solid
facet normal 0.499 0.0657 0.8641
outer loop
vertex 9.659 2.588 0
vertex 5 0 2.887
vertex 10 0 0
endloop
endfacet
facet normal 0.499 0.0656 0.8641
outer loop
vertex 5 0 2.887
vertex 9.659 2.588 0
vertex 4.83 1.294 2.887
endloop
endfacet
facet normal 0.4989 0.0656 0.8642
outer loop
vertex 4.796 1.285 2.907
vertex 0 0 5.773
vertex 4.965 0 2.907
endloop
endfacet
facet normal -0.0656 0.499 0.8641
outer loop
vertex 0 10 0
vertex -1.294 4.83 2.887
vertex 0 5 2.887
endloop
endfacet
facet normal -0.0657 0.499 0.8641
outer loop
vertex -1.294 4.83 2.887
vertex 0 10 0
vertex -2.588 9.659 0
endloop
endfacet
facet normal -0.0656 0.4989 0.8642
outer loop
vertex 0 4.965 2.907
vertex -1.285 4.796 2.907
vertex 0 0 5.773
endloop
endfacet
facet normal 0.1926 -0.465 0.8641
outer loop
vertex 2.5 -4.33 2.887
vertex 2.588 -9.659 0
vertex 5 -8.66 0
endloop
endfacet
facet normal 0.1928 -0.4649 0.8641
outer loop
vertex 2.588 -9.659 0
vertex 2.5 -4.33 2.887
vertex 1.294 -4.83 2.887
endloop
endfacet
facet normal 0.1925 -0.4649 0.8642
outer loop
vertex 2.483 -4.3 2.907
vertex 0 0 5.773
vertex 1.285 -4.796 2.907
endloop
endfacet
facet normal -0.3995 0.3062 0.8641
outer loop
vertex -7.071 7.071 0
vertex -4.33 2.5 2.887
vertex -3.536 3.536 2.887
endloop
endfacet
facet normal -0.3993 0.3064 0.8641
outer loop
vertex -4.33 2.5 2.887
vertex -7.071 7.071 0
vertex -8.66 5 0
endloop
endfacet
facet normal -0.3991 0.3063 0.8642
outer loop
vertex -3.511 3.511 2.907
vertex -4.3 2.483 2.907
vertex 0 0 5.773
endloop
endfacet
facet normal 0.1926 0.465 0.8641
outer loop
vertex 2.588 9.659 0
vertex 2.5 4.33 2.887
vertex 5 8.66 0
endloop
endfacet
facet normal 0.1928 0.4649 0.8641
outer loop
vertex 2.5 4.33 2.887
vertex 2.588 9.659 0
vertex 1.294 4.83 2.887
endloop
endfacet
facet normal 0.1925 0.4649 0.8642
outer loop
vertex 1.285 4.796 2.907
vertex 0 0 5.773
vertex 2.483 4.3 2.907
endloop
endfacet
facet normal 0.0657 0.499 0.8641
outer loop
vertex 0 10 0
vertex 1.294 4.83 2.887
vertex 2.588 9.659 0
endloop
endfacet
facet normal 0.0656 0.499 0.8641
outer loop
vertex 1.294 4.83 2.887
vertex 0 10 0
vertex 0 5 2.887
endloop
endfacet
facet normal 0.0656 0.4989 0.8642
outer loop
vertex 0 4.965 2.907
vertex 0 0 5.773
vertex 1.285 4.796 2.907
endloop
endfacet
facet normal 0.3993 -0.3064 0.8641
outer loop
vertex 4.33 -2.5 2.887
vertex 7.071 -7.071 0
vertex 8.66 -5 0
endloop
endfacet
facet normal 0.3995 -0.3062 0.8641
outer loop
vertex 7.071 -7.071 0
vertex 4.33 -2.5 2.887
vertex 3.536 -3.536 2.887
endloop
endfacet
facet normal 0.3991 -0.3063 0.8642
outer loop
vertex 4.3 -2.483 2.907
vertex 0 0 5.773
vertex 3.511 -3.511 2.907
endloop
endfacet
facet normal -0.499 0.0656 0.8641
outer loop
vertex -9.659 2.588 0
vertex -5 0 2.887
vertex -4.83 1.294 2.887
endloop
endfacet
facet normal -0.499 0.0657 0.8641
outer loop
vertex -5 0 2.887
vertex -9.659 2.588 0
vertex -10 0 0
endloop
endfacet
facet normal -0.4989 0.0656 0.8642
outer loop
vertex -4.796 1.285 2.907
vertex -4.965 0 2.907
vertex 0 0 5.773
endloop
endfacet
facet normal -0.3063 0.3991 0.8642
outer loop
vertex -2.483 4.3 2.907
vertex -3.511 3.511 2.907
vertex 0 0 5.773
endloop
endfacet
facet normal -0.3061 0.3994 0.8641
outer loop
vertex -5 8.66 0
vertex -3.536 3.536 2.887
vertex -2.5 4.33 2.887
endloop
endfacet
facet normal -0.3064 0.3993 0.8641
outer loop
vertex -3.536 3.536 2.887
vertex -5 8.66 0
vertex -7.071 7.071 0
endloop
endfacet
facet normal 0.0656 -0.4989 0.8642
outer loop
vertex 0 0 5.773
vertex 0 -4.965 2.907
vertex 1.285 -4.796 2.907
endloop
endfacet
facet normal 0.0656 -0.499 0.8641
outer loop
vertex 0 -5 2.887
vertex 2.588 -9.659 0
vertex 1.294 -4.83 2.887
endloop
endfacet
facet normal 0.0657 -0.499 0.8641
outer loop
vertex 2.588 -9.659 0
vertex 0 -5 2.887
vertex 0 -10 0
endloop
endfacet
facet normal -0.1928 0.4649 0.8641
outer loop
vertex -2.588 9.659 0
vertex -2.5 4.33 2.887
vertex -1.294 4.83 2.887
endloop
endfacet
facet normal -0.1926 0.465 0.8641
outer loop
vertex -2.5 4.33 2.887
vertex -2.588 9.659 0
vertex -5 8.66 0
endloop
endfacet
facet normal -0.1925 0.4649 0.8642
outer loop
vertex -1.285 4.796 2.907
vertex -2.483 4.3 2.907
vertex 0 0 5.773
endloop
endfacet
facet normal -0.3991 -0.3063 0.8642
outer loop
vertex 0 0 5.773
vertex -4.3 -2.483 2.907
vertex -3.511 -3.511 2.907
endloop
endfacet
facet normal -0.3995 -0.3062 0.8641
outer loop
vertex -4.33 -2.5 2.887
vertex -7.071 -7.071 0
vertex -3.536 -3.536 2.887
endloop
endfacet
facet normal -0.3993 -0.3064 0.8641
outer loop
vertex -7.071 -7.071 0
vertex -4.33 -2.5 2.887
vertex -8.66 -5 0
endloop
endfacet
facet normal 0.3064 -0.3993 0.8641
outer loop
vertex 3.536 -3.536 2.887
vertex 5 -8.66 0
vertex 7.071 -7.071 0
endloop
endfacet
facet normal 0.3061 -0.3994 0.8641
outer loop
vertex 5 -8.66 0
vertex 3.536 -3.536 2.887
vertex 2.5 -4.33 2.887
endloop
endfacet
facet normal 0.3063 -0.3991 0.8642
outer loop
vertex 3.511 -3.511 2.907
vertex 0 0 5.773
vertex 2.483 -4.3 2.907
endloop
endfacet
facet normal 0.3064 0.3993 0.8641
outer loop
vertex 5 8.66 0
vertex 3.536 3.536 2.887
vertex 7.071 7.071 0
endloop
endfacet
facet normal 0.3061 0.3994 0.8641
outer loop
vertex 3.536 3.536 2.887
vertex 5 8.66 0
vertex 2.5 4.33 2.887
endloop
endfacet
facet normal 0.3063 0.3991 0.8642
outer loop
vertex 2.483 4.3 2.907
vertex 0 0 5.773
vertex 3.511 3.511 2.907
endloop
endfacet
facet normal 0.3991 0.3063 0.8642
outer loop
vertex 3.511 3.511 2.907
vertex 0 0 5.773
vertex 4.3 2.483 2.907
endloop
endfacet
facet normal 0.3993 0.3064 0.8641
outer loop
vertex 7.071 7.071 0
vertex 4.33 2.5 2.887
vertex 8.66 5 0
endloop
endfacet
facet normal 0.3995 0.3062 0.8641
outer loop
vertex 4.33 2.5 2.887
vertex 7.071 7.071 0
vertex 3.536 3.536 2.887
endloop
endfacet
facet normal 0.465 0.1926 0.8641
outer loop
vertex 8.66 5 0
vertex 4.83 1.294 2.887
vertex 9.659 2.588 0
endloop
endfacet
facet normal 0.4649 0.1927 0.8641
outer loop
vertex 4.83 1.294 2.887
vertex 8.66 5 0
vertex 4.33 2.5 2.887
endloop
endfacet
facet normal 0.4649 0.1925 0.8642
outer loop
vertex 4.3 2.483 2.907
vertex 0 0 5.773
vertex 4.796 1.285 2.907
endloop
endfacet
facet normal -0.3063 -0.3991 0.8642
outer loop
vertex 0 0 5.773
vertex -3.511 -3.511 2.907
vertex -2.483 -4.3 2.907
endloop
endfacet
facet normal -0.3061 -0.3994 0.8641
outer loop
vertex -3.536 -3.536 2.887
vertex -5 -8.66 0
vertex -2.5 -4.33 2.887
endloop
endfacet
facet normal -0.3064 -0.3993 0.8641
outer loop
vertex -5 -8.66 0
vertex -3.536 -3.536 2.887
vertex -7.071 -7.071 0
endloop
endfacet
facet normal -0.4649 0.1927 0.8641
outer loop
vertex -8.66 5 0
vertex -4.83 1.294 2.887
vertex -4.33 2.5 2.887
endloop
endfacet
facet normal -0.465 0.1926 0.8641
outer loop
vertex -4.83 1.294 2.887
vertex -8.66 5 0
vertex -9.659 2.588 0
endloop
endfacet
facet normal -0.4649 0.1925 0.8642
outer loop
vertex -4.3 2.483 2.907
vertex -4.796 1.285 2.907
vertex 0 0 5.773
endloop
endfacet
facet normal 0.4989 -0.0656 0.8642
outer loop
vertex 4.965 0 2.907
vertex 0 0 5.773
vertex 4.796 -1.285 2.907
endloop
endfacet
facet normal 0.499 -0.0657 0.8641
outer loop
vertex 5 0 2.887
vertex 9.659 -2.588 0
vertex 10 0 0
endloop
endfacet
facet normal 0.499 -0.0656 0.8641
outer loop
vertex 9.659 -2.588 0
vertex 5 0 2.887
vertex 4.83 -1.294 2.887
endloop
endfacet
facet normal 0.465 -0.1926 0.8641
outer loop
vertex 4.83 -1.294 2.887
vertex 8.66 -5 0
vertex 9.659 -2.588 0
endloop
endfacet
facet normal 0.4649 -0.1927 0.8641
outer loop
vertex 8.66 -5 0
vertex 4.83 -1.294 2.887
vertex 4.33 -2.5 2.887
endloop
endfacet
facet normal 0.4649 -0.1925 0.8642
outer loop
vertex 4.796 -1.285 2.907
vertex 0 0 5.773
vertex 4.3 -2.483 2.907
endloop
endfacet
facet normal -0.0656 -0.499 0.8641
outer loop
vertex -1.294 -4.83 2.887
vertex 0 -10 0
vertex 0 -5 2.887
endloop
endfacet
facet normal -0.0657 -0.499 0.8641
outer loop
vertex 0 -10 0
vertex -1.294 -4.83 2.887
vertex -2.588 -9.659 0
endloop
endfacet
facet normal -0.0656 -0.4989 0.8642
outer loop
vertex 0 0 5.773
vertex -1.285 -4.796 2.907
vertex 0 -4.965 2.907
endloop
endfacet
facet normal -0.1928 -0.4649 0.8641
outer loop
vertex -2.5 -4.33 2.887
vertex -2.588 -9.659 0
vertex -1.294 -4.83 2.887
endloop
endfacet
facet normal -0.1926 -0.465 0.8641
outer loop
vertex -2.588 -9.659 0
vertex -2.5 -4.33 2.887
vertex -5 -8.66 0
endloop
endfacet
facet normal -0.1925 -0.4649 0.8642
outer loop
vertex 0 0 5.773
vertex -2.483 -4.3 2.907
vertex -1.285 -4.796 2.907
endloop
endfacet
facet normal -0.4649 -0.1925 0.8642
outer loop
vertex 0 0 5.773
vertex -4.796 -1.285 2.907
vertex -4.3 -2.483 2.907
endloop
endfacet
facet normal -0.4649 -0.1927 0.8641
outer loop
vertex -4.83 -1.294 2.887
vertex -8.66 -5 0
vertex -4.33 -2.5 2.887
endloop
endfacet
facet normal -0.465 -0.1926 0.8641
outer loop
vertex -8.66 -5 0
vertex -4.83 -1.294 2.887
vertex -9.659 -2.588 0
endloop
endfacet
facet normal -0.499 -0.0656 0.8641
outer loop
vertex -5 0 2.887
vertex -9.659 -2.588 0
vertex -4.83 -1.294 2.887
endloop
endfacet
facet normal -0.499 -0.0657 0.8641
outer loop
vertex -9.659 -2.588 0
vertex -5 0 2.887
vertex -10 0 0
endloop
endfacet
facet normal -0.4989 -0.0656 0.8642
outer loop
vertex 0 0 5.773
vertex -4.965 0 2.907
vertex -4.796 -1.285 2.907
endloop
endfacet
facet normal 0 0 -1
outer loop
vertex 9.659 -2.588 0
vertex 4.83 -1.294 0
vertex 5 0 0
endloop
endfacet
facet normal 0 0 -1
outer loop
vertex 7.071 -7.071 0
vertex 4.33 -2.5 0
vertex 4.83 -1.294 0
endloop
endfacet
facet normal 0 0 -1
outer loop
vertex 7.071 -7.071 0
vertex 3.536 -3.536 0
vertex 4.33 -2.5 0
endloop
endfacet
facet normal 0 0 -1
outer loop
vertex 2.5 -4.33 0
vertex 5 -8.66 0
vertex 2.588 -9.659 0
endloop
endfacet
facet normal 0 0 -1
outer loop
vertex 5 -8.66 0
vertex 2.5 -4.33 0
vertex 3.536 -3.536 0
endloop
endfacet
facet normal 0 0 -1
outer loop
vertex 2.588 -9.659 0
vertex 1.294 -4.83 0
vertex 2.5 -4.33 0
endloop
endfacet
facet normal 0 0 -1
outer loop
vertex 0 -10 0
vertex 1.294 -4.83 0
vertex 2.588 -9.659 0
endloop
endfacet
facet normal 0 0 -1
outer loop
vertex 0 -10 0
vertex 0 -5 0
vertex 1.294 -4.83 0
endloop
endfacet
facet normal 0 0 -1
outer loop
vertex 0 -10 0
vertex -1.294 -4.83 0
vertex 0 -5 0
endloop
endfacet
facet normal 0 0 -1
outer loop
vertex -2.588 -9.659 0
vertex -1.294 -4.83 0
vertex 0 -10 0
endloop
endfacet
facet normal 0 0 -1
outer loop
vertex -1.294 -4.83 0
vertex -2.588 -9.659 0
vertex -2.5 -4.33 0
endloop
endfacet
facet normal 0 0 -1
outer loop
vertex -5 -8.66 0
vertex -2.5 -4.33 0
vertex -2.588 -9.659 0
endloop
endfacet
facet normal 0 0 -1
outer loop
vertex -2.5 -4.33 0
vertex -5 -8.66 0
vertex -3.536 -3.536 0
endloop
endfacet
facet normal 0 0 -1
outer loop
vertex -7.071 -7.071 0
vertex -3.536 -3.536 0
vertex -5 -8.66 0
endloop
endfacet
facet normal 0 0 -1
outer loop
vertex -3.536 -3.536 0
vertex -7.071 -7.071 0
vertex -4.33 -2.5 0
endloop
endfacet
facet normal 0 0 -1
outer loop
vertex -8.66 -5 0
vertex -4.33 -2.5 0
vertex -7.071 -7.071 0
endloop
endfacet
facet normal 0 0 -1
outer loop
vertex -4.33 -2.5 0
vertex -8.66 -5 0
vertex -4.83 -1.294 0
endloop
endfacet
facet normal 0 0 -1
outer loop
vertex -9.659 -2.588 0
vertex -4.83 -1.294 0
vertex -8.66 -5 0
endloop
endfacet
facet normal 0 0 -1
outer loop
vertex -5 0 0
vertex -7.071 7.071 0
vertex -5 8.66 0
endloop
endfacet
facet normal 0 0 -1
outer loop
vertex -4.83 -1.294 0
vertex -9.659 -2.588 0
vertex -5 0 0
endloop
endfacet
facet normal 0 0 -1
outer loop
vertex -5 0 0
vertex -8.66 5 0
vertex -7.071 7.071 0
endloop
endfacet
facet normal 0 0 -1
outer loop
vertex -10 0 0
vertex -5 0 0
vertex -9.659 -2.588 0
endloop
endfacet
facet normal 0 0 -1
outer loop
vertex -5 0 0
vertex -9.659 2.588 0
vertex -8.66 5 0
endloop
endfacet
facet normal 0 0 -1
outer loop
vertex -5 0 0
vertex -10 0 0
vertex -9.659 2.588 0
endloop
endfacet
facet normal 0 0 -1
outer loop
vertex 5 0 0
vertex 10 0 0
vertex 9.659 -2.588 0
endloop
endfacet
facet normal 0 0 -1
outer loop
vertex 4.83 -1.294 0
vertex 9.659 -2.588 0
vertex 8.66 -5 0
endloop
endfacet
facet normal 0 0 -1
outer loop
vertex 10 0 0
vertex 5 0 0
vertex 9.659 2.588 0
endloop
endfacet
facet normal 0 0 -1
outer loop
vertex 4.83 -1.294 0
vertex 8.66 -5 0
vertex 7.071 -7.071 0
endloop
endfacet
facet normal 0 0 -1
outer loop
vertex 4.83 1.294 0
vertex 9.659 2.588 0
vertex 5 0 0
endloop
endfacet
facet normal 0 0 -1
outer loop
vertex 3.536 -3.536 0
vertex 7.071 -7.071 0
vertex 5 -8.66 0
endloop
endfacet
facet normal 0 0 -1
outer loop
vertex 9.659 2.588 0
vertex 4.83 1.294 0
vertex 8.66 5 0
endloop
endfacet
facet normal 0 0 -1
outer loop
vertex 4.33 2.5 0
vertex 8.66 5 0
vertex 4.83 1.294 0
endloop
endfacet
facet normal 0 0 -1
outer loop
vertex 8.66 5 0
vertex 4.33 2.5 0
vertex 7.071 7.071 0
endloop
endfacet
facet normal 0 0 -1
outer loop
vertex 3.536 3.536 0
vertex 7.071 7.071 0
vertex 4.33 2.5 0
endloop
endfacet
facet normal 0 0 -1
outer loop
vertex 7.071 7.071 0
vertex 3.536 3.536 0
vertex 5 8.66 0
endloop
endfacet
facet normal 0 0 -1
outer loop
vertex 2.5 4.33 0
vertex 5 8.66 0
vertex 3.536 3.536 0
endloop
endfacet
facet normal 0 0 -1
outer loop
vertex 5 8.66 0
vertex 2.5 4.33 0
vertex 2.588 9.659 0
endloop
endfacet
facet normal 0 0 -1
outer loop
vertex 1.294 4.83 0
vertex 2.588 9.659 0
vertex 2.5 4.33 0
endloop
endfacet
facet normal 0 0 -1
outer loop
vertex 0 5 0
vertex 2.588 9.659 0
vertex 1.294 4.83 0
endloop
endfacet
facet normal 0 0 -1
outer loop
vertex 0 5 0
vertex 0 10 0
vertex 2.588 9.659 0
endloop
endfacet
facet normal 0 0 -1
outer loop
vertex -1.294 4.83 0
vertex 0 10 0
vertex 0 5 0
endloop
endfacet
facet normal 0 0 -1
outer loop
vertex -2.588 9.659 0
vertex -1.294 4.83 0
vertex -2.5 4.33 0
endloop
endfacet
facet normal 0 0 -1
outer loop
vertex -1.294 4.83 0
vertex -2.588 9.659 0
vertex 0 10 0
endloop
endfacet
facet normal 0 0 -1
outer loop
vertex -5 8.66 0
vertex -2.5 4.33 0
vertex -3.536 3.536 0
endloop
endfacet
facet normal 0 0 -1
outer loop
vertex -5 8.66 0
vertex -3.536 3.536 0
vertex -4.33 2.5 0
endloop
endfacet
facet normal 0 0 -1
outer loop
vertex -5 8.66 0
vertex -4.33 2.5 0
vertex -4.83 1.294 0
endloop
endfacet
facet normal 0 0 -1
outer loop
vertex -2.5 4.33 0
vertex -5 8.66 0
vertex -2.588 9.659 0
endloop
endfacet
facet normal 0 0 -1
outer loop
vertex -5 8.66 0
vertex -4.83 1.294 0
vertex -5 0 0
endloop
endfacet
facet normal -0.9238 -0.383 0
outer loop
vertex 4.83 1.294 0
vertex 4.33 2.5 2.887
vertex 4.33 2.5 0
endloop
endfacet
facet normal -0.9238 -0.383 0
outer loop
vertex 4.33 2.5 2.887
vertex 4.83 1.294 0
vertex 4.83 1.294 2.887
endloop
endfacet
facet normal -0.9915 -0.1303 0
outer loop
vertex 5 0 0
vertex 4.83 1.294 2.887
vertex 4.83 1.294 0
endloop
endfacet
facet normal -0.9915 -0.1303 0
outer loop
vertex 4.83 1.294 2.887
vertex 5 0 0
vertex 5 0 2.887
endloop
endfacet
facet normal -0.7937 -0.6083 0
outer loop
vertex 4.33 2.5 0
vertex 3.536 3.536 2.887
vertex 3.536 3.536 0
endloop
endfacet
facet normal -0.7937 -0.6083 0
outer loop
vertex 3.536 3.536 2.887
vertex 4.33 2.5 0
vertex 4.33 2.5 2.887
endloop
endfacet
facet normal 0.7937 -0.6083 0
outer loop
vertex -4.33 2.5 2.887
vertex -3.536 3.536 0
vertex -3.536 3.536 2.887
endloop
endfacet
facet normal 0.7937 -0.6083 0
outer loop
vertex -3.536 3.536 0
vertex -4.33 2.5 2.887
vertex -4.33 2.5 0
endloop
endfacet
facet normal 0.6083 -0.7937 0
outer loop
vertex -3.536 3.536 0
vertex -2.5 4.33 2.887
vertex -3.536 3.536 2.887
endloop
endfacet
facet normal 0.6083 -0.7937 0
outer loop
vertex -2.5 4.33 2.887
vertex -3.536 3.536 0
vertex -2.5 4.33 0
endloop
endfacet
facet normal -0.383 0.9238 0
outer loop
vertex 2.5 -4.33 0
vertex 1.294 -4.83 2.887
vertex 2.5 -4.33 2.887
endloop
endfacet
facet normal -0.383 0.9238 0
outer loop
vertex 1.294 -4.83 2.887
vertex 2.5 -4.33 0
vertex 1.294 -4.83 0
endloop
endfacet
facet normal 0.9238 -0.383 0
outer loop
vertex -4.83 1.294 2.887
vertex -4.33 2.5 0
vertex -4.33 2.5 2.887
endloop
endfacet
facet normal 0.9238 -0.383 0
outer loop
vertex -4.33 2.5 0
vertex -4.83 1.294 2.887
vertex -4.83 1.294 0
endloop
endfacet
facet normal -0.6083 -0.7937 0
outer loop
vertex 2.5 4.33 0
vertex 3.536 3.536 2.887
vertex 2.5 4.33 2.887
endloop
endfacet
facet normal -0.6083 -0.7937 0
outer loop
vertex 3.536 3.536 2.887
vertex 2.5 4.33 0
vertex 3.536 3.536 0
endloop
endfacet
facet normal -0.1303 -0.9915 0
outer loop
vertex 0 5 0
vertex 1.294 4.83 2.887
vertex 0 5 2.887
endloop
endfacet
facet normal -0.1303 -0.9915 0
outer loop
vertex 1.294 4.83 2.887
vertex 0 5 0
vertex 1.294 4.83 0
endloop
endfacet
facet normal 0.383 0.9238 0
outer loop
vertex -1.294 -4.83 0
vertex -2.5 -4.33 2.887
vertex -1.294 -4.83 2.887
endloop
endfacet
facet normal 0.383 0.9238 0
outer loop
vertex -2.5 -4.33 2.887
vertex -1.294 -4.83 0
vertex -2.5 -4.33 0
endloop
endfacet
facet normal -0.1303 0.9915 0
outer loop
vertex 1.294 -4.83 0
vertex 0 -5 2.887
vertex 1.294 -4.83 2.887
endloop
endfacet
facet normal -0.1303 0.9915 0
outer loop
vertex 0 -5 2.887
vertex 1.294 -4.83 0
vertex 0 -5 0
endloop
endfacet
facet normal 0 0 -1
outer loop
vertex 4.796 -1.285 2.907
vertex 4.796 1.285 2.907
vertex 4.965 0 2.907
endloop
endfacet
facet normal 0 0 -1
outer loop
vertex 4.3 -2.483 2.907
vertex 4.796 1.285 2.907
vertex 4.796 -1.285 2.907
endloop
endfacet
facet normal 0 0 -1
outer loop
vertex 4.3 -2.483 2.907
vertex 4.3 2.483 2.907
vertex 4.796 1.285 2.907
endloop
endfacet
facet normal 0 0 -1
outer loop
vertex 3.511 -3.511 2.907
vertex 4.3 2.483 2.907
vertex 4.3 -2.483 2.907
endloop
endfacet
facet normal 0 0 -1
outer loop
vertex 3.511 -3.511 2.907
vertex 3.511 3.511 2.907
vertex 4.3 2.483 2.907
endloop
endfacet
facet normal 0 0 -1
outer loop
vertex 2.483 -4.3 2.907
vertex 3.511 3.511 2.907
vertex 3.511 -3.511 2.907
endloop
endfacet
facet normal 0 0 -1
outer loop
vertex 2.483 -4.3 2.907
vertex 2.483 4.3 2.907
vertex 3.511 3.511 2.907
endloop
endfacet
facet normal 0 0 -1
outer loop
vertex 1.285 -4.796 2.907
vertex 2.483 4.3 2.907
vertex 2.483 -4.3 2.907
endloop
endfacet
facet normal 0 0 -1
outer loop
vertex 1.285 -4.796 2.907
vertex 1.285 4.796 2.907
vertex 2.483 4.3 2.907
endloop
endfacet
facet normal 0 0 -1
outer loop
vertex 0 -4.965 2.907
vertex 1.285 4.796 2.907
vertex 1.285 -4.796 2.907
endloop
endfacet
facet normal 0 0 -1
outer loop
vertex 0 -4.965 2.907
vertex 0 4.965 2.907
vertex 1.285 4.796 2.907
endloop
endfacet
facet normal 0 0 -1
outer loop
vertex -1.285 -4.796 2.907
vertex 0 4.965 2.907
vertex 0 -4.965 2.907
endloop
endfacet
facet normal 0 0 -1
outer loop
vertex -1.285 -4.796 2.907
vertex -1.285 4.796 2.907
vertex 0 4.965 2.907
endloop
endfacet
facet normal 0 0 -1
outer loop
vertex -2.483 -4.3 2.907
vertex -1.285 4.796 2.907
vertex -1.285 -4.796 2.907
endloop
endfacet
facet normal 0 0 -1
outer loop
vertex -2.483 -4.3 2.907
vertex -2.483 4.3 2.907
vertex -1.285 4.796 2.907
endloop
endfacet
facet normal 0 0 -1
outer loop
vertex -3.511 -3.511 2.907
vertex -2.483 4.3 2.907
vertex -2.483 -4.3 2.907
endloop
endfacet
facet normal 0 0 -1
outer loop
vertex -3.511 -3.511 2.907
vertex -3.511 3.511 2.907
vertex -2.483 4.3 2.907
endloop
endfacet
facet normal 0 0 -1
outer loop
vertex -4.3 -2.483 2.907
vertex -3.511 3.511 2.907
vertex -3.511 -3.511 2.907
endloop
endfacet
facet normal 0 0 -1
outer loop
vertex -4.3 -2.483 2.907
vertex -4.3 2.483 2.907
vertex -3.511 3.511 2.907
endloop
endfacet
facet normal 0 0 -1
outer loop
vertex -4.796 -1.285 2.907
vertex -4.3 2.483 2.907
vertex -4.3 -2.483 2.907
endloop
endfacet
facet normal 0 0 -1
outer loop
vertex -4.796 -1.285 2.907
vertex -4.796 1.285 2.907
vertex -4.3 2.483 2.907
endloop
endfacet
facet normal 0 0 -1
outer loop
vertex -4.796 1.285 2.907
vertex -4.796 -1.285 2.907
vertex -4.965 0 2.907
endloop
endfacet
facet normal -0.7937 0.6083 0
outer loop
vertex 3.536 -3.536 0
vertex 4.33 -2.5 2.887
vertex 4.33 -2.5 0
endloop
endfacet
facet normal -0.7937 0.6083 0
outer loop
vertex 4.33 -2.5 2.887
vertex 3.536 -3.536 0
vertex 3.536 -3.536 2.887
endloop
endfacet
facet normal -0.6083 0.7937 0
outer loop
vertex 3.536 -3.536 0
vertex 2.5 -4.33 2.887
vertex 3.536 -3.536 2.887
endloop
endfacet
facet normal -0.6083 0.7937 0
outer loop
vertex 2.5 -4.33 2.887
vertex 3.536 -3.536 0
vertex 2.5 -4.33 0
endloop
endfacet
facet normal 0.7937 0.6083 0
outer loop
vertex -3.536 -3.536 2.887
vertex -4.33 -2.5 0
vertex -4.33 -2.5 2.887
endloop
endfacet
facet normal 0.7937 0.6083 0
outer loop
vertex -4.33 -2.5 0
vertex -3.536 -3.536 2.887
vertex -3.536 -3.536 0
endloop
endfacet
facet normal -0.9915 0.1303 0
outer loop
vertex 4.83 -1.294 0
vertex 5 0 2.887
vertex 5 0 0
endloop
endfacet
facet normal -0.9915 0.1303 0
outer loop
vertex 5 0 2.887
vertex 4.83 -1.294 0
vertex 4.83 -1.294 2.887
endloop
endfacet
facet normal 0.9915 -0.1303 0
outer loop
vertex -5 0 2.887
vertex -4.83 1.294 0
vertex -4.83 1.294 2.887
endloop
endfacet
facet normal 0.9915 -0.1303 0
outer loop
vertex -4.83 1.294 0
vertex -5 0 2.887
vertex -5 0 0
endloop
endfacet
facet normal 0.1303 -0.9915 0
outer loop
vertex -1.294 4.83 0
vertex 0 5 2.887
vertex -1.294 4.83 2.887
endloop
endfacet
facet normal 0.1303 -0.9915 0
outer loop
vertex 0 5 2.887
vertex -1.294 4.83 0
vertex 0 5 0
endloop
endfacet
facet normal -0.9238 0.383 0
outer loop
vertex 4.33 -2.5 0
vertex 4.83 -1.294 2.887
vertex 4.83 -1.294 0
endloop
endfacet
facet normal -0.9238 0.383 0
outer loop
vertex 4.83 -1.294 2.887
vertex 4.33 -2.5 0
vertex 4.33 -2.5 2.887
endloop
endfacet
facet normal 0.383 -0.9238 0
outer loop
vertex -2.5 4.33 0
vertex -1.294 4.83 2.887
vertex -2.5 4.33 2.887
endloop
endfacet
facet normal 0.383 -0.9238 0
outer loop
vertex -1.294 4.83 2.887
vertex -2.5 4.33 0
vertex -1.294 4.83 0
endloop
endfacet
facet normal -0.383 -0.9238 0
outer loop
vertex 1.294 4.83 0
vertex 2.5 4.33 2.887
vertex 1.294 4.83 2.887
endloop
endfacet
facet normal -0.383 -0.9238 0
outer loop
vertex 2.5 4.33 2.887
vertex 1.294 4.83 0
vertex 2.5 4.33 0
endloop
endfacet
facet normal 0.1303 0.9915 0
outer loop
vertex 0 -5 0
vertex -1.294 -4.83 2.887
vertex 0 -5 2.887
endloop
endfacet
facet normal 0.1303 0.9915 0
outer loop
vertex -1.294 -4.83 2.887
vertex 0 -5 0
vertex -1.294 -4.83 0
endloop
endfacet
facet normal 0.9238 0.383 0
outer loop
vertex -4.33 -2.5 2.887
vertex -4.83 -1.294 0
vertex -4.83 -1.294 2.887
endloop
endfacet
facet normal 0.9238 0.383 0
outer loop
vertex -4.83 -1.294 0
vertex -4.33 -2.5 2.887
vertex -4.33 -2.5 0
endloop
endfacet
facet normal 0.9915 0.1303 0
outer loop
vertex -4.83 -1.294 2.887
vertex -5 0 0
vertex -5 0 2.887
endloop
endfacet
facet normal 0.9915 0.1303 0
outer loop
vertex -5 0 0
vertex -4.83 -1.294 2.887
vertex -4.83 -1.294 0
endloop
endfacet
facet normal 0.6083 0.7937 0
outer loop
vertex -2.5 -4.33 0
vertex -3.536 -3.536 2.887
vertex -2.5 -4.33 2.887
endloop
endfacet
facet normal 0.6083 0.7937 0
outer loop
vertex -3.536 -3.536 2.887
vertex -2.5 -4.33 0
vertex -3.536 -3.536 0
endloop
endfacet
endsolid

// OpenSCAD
// Generated by scadwright. Do not hand-edit —
// edit the Python source and regenerate.

$fn = 24;

// FilletRing
difference() {
    cylinder(h=5.7735, r1=10, r2=0, center=false);
    translate([0, 0, -0.02]) {
        cylinder(h=2.92675, r=5, center=false);
    }
}
